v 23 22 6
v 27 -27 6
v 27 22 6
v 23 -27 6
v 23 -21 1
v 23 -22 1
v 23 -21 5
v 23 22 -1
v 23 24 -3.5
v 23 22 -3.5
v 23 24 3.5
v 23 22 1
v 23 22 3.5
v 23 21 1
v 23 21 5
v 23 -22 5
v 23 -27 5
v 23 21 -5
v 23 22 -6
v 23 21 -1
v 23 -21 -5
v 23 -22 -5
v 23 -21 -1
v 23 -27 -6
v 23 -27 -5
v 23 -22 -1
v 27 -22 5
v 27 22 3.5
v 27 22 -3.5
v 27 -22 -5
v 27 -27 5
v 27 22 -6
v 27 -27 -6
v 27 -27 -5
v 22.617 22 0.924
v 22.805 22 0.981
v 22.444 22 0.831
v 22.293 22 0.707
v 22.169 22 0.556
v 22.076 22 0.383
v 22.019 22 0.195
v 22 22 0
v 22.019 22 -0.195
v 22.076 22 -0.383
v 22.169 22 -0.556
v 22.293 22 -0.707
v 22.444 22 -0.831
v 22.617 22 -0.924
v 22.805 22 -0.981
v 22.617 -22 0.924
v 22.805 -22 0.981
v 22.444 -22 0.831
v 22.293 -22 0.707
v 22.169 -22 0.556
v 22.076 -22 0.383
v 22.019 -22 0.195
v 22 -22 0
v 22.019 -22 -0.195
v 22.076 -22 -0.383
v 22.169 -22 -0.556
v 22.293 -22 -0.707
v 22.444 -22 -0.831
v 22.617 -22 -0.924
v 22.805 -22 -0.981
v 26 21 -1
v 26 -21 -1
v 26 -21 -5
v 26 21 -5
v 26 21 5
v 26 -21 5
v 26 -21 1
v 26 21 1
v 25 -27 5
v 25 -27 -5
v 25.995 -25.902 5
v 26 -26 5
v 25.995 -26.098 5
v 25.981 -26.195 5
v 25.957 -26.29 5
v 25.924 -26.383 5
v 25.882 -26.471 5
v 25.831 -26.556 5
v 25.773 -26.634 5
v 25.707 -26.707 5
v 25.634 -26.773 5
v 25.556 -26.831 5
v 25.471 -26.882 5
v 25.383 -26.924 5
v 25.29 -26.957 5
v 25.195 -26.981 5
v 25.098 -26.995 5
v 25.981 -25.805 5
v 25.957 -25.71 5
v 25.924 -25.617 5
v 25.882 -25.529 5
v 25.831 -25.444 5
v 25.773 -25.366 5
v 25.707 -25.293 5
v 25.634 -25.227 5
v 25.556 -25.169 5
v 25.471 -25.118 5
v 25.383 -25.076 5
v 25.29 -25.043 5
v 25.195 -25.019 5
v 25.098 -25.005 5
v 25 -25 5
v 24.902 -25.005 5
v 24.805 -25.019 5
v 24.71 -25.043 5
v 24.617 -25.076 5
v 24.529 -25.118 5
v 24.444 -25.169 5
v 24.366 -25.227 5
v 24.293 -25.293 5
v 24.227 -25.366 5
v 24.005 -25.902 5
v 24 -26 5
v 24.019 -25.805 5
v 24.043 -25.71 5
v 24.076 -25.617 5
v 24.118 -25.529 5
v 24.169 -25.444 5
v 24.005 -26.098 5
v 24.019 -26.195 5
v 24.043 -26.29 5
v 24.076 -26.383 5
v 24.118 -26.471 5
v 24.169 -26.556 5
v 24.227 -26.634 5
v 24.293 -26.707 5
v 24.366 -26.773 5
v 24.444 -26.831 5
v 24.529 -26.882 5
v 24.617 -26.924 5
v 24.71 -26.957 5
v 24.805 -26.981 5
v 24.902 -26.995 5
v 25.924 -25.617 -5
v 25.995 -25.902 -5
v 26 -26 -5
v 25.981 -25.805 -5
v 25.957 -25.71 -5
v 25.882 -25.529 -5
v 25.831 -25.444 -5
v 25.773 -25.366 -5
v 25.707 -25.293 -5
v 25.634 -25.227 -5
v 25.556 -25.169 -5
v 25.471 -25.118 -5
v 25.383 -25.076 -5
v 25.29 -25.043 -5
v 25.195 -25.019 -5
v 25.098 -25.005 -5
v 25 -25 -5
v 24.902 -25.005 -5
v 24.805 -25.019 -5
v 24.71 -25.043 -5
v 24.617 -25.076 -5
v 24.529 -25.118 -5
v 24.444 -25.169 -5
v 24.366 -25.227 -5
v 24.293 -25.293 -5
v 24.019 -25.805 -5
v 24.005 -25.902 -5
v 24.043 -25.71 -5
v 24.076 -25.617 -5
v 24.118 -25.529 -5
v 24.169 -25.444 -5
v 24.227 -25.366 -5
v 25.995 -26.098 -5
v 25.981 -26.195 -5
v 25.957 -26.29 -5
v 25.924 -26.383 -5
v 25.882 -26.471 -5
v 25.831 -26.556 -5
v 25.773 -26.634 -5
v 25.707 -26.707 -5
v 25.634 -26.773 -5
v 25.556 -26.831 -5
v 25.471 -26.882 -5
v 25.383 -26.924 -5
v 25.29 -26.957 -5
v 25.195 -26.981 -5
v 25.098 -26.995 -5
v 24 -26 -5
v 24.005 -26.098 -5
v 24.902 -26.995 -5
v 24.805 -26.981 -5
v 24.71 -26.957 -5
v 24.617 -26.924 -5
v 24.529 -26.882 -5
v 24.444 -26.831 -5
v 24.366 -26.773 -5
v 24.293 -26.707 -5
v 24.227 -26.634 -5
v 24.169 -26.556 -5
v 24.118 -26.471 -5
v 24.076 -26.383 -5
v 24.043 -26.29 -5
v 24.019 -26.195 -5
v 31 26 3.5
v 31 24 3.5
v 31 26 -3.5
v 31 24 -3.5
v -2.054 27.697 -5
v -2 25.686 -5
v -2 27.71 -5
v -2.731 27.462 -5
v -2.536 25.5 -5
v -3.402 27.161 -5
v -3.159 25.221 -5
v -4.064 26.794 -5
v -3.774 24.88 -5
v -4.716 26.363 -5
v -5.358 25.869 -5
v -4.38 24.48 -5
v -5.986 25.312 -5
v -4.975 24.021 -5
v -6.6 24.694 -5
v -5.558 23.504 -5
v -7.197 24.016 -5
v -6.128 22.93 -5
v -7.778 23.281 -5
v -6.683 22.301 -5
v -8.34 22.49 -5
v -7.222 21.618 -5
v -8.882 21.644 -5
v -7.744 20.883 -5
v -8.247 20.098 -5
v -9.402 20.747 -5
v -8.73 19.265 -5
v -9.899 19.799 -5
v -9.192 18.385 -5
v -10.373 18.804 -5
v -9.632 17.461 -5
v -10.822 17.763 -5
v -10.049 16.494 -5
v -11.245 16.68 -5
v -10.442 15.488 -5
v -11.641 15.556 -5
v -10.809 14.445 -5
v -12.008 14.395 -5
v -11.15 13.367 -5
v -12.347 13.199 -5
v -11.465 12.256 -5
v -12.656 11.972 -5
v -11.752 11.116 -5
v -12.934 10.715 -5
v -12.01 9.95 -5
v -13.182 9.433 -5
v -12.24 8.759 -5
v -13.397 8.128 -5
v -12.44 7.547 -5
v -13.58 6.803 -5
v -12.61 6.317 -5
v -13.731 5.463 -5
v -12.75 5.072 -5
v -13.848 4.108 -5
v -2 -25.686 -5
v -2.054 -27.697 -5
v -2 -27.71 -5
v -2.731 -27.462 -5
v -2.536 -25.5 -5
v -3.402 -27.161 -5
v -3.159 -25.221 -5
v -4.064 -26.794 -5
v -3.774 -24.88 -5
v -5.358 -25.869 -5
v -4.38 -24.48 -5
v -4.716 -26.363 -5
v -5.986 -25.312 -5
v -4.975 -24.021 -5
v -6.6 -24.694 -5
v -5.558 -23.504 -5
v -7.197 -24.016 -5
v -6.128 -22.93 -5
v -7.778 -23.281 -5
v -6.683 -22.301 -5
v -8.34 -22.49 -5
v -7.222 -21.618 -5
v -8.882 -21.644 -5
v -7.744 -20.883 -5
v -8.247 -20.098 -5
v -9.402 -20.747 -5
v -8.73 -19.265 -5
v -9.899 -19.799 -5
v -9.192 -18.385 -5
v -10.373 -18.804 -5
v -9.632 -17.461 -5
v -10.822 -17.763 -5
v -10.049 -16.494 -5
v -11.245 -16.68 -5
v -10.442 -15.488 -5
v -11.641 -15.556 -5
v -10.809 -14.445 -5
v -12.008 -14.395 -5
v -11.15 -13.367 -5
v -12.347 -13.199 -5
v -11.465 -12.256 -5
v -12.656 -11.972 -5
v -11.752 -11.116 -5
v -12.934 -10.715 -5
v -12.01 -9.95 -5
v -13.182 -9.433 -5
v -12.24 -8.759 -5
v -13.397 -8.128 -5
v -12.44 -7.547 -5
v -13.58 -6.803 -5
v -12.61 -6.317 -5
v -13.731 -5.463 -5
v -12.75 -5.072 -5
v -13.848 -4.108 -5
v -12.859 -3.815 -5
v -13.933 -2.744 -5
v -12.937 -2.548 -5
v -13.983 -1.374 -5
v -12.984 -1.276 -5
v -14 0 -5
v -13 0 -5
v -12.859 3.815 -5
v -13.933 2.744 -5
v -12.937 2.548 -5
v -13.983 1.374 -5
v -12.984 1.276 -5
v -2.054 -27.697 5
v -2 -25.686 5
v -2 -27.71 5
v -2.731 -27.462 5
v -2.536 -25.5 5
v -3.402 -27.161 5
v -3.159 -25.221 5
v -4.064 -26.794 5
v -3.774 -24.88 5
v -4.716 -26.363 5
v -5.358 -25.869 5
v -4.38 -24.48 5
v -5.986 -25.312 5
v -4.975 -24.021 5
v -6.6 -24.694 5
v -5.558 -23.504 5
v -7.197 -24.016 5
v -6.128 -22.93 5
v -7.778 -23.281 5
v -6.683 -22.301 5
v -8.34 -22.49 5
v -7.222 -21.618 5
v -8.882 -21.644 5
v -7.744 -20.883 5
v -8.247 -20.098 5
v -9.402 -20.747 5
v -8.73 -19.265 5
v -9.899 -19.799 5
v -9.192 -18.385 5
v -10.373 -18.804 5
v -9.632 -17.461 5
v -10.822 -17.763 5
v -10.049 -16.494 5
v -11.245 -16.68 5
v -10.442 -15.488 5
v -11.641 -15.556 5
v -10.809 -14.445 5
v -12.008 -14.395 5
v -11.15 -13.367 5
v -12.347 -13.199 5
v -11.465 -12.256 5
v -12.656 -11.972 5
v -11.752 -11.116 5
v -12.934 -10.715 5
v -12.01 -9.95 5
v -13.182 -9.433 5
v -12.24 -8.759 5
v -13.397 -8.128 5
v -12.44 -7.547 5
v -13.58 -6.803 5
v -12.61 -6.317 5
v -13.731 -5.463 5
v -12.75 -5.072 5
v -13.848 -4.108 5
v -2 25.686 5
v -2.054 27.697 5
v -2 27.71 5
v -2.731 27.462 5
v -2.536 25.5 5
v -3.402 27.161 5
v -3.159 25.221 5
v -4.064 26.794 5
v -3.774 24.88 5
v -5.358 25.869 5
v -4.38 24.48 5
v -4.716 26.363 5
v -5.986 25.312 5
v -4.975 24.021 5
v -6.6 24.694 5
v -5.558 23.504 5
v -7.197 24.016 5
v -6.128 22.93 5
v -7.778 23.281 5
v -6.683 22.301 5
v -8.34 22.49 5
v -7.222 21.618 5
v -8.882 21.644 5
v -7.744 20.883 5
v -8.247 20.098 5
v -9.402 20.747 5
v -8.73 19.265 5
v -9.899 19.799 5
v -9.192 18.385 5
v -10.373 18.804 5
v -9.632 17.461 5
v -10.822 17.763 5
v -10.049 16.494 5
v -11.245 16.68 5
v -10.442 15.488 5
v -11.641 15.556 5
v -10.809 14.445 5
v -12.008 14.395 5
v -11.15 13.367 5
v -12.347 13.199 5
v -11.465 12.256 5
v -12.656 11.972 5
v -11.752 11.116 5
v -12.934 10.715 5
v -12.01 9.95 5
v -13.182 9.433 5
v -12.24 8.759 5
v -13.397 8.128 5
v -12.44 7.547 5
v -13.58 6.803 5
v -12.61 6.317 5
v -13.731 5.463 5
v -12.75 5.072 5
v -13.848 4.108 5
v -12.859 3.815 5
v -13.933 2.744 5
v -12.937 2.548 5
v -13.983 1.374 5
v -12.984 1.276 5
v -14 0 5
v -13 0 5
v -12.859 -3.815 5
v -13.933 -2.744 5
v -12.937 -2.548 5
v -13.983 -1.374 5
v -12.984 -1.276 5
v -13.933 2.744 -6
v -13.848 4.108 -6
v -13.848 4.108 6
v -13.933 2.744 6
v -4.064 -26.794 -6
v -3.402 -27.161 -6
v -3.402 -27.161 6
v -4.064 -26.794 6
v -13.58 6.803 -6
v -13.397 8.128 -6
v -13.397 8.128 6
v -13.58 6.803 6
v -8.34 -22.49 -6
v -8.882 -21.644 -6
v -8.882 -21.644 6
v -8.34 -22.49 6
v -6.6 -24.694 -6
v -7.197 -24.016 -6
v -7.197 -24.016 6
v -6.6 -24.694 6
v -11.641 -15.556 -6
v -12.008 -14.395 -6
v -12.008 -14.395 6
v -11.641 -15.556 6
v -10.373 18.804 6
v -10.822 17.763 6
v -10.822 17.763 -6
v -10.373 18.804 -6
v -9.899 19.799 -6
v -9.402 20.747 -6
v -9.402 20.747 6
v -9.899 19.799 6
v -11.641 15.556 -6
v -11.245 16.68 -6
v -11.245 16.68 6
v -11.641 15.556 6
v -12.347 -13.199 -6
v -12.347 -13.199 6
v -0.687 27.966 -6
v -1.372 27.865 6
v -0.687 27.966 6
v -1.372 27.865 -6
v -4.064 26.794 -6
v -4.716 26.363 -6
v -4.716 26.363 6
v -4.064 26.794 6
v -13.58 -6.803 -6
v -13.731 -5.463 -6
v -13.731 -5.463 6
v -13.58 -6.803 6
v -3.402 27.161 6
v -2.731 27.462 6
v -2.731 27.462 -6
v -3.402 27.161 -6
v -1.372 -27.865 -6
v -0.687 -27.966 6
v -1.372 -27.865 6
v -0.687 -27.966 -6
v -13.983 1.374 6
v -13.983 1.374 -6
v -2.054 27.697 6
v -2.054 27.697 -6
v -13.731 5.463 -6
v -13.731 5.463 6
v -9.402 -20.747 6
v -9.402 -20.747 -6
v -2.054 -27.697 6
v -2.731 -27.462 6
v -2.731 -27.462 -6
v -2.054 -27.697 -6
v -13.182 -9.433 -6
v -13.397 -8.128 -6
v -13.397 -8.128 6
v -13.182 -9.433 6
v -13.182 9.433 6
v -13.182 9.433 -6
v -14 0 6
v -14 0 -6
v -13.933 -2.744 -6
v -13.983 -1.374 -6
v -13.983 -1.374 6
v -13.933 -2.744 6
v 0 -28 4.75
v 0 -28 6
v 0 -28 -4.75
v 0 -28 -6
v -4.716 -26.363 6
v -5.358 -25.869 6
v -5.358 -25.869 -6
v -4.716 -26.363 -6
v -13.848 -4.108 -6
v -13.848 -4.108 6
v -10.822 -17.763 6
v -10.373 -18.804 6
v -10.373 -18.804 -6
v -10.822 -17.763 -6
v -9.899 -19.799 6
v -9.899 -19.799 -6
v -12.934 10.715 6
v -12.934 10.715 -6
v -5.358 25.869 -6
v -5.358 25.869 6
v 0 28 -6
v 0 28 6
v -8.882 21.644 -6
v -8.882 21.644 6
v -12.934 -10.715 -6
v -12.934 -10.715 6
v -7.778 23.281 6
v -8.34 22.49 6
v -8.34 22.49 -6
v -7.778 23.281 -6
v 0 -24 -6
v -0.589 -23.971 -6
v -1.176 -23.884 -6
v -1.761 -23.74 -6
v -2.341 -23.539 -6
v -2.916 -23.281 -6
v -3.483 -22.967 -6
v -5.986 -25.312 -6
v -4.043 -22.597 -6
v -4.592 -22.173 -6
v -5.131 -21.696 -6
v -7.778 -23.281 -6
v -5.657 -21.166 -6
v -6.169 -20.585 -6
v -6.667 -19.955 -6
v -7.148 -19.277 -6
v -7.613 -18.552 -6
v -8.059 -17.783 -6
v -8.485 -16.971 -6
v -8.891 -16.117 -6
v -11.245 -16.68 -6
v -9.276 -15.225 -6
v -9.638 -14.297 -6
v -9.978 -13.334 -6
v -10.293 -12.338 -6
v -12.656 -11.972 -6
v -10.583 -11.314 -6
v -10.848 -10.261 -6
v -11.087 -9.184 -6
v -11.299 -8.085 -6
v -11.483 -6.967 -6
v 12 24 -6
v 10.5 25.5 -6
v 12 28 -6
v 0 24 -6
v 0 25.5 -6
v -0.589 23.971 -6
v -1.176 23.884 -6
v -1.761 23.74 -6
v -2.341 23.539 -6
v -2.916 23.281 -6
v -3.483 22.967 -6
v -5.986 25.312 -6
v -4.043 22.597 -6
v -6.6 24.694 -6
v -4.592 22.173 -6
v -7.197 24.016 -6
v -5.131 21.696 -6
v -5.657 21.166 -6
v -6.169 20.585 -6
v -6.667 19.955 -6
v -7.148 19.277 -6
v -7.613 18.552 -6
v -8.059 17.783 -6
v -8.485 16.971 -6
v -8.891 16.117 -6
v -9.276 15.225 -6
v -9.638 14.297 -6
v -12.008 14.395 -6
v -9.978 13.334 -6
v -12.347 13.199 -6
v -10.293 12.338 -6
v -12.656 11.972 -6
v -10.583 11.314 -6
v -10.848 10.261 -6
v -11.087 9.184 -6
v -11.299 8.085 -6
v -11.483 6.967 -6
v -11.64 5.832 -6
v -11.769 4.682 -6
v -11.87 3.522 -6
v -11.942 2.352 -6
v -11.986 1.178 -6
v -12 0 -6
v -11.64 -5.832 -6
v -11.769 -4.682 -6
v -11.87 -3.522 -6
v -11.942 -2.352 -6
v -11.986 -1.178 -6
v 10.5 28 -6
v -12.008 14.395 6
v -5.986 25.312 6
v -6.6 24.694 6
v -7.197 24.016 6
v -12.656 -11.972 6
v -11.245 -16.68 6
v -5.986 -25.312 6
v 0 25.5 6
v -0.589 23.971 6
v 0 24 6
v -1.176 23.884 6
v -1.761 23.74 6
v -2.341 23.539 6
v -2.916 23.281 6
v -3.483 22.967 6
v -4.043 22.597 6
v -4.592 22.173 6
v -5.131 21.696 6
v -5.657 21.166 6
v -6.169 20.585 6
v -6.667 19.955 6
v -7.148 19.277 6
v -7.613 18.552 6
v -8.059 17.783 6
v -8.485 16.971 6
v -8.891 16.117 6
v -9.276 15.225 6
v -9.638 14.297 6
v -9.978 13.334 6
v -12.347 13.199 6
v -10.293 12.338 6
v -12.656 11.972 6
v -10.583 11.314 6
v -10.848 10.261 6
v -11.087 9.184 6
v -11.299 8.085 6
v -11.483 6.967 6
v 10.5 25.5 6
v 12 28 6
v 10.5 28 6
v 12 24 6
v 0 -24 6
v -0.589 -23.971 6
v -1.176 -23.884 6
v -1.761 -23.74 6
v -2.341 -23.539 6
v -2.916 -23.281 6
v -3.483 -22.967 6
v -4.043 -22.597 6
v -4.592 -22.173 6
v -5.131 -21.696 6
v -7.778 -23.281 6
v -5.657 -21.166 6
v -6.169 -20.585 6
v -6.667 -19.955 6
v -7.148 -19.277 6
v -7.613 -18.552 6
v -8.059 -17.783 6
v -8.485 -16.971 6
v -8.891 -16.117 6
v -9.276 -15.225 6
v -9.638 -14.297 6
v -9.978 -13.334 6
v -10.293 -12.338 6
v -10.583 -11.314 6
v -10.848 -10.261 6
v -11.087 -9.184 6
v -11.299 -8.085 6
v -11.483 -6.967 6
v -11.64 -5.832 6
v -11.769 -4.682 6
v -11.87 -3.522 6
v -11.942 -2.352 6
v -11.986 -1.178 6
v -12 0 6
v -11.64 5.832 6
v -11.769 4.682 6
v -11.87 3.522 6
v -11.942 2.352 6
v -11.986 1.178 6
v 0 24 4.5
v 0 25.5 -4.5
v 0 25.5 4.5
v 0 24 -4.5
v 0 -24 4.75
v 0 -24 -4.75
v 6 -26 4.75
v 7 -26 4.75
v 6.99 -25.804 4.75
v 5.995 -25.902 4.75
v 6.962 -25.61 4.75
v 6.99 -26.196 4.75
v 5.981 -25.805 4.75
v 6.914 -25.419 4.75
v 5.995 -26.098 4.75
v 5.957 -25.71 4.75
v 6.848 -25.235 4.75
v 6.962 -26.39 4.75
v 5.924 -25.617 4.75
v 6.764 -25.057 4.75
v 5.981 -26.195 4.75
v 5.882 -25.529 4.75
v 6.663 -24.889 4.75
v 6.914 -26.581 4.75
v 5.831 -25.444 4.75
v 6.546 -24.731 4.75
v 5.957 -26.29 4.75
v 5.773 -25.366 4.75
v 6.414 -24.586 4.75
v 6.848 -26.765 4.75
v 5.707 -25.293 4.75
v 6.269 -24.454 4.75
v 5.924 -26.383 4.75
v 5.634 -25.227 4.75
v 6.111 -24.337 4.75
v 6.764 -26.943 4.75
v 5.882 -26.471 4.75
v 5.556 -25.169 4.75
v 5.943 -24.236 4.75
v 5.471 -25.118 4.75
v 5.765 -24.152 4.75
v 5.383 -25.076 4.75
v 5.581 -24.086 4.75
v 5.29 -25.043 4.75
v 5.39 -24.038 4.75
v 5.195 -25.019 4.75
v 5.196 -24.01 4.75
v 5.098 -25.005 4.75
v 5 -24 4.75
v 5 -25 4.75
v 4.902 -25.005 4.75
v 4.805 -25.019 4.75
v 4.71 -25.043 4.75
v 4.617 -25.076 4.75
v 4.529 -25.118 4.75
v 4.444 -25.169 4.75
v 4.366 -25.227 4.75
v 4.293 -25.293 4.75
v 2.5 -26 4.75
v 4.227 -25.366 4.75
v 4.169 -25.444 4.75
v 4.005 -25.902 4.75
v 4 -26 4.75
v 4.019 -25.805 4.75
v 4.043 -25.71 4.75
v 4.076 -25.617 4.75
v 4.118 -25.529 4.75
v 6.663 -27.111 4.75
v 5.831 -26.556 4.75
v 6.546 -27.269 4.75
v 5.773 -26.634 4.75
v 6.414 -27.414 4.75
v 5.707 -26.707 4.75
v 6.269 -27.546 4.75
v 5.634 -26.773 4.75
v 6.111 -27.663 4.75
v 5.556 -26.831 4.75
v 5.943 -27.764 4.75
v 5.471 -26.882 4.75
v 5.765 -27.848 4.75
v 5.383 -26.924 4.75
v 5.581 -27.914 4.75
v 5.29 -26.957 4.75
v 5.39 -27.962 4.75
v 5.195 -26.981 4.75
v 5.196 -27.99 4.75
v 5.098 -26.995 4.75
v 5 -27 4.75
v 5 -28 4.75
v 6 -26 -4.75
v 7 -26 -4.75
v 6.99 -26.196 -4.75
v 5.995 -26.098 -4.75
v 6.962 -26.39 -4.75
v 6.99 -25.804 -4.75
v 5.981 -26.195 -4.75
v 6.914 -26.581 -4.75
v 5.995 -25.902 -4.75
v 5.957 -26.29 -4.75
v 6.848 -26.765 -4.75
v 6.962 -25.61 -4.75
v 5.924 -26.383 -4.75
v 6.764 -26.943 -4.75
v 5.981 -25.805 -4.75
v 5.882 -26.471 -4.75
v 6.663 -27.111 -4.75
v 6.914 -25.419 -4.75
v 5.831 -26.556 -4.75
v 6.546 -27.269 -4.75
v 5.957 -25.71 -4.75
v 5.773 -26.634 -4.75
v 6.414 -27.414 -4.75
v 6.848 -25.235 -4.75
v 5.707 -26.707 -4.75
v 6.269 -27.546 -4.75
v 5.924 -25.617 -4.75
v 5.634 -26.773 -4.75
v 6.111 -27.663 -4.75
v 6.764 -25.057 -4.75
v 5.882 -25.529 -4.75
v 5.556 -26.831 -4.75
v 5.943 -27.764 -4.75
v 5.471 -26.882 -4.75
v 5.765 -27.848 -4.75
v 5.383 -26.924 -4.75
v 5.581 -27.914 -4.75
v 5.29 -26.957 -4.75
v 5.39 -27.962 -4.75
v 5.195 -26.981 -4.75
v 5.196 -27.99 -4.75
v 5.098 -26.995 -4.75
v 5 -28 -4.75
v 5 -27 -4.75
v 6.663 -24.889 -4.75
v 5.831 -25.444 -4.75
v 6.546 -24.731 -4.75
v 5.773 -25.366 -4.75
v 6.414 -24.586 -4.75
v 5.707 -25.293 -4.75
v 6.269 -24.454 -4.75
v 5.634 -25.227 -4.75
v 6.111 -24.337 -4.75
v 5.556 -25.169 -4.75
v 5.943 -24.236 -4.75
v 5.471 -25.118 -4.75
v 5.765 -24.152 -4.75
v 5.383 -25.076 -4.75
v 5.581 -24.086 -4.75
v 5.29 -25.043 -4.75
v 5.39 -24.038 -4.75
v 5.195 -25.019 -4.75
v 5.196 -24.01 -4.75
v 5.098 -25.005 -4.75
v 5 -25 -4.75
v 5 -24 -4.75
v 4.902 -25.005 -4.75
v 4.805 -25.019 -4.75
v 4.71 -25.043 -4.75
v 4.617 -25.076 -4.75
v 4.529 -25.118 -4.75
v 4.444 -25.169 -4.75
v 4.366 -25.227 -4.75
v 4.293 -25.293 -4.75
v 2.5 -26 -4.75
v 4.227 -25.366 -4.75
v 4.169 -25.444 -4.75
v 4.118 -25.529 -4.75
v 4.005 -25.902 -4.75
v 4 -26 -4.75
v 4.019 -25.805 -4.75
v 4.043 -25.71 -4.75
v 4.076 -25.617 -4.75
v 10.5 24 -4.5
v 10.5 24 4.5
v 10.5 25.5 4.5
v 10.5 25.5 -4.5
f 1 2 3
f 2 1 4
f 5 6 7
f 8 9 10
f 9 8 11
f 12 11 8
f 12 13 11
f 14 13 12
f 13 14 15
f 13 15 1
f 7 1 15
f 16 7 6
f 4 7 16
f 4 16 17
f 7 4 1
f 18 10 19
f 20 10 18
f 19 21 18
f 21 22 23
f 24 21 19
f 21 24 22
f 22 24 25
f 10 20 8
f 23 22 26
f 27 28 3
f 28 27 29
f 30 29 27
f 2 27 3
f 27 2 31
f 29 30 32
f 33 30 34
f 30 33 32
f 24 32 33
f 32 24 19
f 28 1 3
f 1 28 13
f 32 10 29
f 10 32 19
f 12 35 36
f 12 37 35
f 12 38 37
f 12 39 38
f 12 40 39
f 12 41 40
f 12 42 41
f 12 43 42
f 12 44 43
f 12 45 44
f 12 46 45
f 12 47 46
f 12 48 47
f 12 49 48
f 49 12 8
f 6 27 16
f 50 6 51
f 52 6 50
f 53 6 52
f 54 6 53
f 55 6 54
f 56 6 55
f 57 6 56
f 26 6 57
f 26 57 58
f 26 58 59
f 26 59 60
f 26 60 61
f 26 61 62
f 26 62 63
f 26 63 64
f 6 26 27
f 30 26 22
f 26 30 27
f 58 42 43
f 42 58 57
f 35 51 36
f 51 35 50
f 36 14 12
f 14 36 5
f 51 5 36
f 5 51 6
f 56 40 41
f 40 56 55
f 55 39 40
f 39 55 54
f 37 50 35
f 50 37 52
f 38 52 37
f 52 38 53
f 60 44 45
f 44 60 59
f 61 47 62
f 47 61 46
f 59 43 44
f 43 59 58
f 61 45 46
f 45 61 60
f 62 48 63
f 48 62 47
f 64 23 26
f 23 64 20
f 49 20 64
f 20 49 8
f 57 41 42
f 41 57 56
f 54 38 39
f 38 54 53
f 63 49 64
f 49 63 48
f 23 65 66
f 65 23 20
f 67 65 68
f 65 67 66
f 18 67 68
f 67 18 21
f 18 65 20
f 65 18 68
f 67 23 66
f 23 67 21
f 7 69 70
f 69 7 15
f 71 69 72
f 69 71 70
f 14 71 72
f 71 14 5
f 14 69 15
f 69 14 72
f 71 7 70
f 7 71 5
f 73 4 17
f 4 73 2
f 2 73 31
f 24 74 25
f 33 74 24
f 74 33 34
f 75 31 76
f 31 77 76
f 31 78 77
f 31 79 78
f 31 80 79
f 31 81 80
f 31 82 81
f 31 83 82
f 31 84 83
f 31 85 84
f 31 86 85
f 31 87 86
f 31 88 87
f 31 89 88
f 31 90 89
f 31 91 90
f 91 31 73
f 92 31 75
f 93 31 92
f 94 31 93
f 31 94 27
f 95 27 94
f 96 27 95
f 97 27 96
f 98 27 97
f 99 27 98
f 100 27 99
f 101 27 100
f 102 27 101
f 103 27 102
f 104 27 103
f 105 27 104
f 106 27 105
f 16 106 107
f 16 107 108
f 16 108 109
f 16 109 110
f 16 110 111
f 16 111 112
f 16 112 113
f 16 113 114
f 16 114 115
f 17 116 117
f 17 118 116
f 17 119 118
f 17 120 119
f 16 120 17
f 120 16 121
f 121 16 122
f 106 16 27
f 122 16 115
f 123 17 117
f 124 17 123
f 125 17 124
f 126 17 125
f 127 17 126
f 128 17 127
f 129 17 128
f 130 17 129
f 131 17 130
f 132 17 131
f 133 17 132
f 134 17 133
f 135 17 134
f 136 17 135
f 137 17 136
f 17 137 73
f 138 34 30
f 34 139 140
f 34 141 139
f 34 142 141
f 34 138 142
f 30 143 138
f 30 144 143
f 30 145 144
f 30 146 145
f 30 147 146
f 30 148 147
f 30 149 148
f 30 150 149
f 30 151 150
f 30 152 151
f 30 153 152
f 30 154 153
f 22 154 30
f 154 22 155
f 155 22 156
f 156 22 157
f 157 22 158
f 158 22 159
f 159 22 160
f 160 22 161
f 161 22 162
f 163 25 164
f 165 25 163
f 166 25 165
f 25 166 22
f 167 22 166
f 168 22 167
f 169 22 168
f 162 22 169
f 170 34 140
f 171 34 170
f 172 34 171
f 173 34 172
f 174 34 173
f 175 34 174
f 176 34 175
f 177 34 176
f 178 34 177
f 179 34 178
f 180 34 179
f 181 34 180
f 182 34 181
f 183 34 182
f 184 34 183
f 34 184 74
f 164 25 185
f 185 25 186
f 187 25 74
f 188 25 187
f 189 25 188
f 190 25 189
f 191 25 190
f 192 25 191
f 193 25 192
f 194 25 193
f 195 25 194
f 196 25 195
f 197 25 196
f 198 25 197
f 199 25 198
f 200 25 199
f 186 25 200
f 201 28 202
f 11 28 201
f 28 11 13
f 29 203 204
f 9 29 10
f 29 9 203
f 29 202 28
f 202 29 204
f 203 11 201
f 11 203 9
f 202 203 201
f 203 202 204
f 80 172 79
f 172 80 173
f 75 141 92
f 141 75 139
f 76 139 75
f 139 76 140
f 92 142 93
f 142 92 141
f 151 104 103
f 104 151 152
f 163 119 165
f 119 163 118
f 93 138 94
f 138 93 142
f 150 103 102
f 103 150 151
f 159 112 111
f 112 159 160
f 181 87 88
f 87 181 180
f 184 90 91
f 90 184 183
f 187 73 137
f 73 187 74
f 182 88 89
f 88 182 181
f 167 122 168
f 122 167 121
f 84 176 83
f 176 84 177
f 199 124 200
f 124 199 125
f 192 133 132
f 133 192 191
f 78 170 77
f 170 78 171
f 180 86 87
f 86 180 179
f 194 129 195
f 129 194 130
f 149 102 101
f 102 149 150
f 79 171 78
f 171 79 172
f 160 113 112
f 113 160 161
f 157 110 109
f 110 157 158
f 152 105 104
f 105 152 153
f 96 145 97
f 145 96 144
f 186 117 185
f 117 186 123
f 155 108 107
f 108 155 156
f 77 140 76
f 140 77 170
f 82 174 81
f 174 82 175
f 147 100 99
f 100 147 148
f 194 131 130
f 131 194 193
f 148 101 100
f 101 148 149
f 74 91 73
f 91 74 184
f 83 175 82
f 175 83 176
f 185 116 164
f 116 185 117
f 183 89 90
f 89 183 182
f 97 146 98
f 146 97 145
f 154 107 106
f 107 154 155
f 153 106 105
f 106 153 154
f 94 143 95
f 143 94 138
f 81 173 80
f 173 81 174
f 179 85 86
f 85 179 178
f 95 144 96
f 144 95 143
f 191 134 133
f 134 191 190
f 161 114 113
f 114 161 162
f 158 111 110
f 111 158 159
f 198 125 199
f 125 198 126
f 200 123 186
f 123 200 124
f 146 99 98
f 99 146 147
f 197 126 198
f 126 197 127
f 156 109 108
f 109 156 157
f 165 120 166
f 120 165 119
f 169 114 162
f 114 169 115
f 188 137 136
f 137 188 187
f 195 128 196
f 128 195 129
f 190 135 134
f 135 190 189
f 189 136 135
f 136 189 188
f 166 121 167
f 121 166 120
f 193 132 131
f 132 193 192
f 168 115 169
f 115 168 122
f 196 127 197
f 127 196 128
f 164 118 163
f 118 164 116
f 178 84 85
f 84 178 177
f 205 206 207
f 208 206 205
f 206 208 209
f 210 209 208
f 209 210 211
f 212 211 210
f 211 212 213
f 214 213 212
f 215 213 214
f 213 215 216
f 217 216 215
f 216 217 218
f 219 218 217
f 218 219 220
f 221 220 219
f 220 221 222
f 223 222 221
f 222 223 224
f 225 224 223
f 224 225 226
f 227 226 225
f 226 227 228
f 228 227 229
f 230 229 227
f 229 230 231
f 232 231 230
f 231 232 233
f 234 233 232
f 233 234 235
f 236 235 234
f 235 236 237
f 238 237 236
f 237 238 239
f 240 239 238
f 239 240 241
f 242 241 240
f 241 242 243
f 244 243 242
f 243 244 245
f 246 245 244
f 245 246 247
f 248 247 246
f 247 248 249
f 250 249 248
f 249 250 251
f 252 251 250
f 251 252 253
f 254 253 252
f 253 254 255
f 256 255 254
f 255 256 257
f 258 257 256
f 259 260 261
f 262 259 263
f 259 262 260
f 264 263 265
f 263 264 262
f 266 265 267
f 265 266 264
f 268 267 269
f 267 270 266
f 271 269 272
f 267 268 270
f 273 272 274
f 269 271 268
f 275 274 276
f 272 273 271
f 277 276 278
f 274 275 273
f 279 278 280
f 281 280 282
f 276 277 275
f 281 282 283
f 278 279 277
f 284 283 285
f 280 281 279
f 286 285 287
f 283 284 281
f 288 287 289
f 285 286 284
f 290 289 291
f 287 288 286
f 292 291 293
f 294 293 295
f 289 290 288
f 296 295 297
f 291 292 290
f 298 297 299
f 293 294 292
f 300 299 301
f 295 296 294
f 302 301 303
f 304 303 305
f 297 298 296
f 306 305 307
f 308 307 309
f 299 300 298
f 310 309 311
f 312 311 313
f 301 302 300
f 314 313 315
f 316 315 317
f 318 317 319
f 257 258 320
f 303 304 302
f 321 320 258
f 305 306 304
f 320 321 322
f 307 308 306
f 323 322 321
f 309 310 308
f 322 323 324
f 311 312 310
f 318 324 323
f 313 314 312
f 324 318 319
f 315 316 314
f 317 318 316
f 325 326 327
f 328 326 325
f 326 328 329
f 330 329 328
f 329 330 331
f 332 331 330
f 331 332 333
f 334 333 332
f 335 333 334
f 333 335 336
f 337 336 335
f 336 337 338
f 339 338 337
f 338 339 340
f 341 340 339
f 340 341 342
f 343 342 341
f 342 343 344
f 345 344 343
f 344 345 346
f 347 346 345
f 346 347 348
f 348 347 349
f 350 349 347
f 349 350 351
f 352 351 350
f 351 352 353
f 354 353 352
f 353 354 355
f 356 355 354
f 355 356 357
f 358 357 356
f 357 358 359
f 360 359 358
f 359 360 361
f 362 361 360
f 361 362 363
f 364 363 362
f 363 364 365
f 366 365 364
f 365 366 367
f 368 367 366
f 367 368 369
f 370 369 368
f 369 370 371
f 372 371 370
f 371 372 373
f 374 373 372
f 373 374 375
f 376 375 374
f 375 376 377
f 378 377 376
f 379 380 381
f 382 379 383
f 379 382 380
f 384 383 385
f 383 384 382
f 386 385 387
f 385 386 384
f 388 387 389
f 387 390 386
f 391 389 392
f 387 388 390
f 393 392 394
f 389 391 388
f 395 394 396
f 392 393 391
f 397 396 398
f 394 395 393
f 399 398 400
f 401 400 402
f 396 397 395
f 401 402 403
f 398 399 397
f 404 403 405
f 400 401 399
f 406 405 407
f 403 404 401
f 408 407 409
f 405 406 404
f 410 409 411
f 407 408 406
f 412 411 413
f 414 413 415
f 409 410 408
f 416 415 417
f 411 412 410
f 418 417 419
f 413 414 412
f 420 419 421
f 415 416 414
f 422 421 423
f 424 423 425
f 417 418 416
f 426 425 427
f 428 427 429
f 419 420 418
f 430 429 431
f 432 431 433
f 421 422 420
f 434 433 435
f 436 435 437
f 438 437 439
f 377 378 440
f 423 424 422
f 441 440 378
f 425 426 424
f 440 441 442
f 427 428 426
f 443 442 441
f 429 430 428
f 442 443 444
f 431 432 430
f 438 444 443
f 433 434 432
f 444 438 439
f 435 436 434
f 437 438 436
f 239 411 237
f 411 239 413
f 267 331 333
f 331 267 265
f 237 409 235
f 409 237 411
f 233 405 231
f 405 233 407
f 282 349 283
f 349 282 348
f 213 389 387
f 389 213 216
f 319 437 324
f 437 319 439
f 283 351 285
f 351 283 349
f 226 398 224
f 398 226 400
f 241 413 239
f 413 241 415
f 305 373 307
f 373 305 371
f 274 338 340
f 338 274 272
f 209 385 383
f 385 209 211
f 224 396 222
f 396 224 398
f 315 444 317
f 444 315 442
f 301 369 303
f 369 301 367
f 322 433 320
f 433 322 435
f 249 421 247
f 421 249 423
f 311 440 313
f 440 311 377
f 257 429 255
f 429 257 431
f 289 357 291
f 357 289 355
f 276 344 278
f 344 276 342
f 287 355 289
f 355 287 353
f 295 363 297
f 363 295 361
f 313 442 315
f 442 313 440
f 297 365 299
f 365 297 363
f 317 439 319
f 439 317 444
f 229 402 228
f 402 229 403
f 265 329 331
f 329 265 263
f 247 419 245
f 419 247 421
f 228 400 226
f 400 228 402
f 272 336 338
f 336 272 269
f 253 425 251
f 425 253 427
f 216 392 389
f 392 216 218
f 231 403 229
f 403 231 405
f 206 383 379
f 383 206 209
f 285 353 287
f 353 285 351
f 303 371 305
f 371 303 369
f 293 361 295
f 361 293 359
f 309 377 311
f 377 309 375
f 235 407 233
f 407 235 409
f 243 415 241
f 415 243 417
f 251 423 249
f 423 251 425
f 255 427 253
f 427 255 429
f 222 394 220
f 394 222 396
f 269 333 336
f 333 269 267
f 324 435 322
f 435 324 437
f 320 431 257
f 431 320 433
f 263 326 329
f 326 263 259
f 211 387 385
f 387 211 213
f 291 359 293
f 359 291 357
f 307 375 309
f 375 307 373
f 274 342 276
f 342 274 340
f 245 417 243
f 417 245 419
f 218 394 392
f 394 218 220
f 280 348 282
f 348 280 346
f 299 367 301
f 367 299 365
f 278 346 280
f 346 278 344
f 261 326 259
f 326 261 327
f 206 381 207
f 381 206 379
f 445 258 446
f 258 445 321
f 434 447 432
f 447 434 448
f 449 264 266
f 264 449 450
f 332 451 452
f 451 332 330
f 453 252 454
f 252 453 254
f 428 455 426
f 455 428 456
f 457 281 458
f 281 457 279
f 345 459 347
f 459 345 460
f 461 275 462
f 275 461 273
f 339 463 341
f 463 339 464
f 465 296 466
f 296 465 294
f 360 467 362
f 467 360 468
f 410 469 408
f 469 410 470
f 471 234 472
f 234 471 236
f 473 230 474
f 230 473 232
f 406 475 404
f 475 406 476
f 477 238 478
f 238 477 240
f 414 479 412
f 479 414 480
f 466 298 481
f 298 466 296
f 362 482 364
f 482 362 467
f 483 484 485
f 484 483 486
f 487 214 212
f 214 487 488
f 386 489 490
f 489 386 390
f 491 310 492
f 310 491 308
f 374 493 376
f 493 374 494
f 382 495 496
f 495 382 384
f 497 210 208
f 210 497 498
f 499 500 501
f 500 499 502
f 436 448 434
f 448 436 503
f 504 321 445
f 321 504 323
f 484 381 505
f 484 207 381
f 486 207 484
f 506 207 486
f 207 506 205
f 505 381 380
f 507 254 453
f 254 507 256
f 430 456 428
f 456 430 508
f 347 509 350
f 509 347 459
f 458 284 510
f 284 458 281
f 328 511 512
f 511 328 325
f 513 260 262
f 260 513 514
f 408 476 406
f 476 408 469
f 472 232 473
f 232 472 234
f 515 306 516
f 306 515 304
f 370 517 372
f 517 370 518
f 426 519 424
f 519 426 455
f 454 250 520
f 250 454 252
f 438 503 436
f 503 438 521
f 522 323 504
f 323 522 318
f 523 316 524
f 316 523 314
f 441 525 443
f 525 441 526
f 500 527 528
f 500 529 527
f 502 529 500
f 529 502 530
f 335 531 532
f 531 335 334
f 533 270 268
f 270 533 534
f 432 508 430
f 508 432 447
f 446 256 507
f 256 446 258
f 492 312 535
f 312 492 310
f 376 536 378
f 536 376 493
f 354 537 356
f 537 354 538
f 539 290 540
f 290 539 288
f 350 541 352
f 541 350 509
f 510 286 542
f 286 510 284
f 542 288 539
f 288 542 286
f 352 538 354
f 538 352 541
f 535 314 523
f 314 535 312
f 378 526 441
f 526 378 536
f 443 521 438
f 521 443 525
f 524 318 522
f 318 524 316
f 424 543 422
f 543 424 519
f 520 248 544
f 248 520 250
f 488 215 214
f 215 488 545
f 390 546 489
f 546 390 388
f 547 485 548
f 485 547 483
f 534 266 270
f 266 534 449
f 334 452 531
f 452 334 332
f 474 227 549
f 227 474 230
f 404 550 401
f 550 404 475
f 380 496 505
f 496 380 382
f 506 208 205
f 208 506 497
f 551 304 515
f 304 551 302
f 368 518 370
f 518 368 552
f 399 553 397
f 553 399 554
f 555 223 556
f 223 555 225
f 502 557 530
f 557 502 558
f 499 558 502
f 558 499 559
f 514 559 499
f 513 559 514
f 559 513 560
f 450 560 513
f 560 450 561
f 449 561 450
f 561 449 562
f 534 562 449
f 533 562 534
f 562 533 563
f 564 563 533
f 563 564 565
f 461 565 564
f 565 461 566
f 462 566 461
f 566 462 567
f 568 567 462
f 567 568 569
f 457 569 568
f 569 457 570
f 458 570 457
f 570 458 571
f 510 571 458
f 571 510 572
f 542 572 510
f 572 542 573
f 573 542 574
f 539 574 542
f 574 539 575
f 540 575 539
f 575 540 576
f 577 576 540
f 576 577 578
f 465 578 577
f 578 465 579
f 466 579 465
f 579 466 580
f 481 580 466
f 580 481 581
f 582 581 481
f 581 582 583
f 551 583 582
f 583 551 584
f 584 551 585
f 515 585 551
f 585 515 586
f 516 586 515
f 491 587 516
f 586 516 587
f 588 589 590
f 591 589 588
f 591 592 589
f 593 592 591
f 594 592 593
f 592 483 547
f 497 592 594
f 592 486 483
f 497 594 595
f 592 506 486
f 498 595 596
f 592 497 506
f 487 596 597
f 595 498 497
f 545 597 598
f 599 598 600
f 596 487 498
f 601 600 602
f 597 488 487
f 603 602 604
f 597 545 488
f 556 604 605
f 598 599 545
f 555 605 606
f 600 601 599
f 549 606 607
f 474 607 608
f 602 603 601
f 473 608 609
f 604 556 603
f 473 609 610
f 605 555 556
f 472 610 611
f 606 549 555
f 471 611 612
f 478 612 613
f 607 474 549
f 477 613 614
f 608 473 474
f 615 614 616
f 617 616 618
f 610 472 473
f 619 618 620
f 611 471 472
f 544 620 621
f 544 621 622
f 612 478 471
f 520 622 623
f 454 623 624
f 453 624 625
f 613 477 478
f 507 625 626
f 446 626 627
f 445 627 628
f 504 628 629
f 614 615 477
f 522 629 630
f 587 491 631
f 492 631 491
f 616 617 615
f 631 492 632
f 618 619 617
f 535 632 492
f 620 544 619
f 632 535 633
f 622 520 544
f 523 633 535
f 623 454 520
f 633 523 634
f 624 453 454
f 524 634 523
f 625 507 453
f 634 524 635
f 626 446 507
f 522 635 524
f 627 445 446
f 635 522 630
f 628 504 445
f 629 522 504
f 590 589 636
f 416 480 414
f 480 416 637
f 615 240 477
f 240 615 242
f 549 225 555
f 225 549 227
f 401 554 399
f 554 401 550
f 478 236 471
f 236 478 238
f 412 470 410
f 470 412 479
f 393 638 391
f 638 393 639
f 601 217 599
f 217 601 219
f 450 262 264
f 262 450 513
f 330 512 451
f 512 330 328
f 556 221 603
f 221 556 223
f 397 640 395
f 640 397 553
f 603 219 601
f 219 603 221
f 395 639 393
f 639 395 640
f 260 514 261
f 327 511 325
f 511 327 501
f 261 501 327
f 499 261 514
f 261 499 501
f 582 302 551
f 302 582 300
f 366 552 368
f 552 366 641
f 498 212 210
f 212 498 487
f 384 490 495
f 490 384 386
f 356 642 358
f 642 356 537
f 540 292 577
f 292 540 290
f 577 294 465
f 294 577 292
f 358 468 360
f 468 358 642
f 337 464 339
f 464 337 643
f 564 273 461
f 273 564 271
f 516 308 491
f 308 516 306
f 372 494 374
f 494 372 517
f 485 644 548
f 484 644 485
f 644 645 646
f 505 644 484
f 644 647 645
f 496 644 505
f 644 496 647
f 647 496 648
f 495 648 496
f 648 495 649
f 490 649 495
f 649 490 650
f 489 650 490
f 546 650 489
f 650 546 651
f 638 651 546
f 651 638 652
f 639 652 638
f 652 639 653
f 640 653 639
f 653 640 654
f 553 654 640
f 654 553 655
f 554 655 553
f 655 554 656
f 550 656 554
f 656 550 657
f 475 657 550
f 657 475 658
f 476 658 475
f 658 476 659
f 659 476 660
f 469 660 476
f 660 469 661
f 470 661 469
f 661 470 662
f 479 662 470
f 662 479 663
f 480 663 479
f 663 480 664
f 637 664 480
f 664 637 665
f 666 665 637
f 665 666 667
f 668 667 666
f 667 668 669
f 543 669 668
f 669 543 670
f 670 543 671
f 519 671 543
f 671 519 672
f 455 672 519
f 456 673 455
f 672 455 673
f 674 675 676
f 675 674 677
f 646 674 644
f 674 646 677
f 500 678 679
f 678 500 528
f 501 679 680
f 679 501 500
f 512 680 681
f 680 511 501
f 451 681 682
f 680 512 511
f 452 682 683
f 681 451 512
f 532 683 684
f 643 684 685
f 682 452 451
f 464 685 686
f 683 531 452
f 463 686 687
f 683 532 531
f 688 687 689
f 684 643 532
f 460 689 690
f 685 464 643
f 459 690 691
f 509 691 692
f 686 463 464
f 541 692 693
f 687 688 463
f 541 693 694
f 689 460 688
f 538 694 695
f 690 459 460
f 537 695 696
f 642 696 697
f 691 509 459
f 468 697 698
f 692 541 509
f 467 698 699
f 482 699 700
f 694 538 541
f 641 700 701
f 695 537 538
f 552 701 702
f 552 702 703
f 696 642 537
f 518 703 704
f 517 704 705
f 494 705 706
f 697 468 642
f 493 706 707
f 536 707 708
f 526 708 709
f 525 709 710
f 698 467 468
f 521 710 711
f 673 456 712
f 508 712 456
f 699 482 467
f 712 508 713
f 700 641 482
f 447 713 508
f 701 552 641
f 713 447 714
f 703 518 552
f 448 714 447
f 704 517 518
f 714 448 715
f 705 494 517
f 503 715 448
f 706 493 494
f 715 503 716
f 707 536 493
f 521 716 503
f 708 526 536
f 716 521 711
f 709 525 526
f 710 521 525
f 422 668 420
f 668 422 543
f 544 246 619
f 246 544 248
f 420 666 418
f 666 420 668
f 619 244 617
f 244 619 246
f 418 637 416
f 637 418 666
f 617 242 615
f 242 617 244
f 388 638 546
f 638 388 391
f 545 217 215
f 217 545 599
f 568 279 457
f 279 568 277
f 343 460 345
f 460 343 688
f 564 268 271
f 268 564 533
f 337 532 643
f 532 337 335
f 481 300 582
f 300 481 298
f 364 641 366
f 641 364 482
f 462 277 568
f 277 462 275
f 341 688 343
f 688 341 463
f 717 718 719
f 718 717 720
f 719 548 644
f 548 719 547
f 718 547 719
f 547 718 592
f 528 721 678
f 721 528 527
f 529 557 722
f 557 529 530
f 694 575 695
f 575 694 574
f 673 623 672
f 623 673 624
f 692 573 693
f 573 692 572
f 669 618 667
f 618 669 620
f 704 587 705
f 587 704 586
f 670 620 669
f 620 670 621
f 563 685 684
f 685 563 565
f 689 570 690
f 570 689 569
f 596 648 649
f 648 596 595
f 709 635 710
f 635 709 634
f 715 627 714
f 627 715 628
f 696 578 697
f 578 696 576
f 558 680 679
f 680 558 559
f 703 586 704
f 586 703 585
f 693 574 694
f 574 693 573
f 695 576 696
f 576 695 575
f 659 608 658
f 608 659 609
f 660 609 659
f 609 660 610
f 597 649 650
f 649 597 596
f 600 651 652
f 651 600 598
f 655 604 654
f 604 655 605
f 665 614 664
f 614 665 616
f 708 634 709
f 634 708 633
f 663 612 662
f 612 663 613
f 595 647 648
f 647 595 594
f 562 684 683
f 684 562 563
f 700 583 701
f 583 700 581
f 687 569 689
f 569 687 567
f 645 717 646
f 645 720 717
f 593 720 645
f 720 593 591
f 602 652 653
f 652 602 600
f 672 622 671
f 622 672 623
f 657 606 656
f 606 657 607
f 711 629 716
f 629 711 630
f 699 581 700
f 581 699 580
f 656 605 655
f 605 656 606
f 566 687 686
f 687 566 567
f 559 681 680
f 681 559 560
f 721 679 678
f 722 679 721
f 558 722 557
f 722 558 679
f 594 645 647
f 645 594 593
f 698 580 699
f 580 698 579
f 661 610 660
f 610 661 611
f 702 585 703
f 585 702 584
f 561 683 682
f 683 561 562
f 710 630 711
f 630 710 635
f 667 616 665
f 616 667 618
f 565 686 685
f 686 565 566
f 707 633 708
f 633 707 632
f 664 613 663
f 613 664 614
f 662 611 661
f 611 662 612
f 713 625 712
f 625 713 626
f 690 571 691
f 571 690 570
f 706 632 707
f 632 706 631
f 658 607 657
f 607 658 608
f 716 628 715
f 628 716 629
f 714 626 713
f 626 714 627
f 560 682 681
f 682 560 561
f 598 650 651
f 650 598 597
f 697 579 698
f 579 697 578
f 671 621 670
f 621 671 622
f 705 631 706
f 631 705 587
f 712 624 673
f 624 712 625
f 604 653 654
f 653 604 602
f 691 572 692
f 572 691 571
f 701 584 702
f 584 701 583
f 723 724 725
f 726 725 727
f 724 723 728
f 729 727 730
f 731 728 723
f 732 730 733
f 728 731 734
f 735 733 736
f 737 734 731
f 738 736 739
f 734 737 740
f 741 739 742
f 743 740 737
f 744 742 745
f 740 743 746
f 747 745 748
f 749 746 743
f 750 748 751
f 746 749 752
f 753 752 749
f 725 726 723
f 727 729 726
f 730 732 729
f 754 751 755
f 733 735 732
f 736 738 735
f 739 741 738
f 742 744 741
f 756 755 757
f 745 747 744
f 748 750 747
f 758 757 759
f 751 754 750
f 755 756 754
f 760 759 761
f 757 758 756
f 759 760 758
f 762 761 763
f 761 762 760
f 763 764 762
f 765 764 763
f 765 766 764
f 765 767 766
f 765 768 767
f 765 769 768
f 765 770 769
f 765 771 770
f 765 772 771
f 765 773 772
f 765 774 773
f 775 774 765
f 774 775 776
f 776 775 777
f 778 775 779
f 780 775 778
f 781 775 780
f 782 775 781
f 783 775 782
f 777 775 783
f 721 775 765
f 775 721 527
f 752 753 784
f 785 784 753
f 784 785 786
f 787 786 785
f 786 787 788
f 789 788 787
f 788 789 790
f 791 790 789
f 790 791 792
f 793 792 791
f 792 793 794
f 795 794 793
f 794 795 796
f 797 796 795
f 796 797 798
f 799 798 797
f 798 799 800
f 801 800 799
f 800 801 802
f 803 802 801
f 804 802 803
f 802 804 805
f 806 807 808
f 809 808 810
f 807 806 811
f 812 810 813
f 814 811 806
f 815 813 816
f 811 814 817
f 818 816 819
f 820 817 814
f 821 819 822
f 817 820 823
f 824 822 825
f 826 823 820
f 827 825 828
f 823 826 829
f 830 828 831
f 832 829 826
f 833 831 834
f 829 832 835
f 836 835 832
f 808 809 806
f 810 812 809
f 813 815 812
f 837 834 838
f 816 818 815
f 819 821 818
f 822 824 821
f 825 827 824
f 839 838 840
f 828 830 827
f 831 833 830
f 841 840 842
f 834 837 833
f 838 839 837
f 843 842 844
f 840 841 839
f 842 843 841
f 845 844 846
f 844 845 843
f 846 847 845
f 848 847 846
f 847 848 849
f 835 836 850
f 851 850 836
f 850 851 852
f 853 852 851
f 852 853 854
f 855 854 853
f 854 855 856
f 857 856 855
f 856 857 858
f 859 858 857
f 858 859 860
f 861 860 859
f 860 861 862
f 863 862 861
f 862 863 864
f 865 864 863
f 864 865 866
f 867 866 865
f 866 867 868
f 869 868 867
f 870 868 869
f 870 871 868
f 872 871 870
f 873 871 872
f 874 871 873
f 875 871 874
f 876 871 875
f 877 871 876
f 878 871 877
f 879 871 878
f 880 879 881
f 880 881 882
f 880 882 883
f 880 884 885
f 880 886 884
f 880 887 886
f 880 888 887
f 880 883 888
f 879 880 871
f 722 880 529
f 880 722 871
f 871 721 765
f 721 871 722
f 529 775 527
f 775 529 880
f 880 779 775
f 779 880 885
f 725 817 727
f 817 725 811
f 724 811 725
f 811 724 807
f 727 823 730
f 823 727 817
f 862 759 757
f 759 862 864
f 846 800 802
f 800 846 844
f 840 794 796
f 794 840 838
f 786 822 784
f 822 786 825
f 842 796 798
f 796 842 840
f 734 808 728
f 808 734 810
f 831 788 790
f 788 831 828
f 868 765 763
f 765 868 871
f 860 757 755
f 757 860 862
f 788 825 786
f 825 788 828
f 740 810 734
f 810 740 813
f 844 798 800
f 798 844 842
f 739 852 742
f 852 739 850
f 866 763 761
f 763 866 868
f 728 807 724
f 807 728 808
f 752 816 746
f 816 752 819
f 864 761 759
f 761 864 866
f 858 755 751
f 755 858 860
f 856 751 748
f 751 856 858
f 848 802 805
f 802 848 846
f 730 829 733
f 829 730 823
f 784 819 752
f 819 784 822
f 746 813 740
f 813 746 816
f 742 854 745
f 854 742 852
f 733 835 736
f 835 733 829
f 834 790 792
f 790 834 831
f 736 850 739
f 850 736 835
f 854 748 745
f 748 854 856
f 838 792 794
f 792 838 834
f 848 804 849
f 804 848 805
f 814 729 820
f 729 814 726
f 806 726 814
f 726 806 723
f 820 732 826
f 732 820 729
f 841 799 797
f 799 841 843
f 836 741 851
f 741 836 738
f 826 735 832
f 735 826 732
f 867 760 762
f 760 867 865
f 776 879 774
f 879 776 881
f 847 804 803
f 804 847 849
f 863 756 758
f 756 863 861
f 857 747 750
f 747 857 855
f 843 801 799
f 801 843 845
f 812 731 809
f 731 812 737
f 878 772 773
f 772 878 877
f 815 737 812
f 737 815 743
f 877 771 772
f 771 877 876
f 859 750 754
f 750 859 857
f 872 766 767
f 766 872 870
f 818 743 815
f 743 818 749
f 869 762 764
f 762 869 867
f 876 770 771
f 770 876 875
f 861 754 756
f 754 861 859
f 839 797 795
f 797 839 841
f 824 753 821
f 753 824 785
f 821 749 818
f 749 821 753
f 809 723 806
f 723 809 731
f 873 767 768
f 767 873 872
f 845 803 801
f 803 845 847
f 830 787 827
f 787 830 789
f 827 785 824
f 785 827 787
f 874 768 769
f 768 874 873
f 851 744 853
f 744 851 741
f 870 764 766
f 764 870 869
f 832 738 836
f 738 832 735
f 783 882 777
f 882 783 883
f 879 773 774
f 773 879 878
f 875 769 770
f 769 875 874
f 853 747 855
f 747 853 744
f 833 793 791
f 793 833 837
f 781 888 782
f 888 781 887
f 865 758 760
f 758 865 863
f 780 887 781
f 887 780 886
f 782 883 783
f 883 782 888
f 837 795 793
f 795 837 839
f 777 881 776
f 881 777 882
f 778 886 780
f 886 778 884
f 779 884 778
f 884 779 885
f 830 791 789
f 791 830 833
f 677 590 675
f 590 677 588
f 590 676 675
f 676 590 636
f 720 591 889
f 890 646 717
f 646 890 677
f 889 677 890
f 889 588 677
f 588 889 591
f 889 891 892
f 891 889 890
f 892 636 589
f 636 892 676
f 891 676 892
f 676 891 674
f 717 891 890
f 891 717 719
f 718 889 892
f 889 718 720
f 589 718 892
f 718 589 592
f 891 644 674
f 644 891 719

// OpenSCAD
nut_width = 44;
capo_length = 12;
capo_back_thickness = 4;
capo_front_thickness = 4;
neck_shape = 0.5;
fretboard_height = 5;
articulation_radius = 2;
articulation_offset = 2;
clip_height = 7;

// front side
translate([20, 0, 0])
translate([fretboard_height, 0, 0]) {
	rotate([0, -90, 0]) difference() {
		// main thing
		union() {
			cube(size=[capo_length, nut_width, capo_front_thickness], center = true);
			translate([0, 0, 2])
				rotate([90, 0, 0])
					cylinder(h = nut_width, r = 1, $fn = 32, center = true);
		}
		
		// cut outs
		translate([-3, 0, 1])
			cube(size = [4, nut_width - 2, 4], center = true);
		translate([3, 0, 1])
			cube(size = [4, nut_width - 2, 4], center = true);
	}

	// articulation attachment
	translate([0, -nut_width/2 -capo_back_thickness/2, 0]) {
		difference() {
			cube(size = [capo_front_thickness, capo_back_thickness + articulation_offset, capo_length], center = true);
			cube(size = [capo_front_thickness + 2, capo_back_thickness + articulation_offset + 2, capo_length - 2], center = true);
		}
	}

	// articulation front
	translate([0, -nut_width/2 -capo_back_thickness/2 - articulation_offset, 0])
		cylinder(h = capo_length, r = articulation_radius/2, $fn=64, center = true);

	// clip attachment
	translate([capo_front_thickness/2, nut_width/2 + capo_back_thickness/2, 0]) {
		scale([capo_front_thickness*2, capo_back_thickness, clip_height]) {
			union() {
				difference() {
					rotate([0, 0, 45]) cube(size=[sqrt(2)/2,sqrt(2)/2,1], center=true);
					translate([0, 0.5, 0]) cube(size=[1, 1, 2], center=true);
				}
				translate([-0.25, -0.25, 0]) cube(size=[0.5,0.5,1], center=true);
				translate([0.5, 0, 0]) scale([2, 1, 1]) rotate([0, 0, 270]) difference() {
					rotate([0, 0, 45]) cube(size=[sqrt(2)/2,sqrt(2)/2,1], center=true);
					translate([0, 0.5, 0]) cube(size=[1, 1, 2], center=true);
					translate([0.5, 0, 0]) cube(size=[1, 1, 2], center=true);
				}
			}
		}
	}
}

// back side
scale([neck_shape, 1, 1])
difference() {
	// main cylinder
	cylinder(h = capo_length, r = nut_width/2 + capo_back_thickness + articulation_offset, $fn = 128, center = true);
	
	// cut half off
	translate([nut_width/2, 0, 0])
		cube(size=[nut_width, nut_width + 2*capo_back_thickness + articulation_offset + 2, capo_length+1], center = true);
	// inner cylinder
	cylinder(h = capo_length+2, r = nut_width/2 + articulation_offset, $fn = 128, center = true);

	// outer cutout
	difference() {
		cylinder(h = capo_length-2, r = nut_width + capo_back_thickness + articulation_offset, $fn = 128, center = true);
		cylinder(h = capo_length, r = nut_width/2 + capo_back_thickness/2 + articulation_offset, $fn = 128, center = true);
		translate([nut_width/2 - capo_back_thickness, 0, 0])
			cube(size=[nut_width, nut_width + 2*capo_back_thickness + articulation_offset + 2, capo_length+1], center = true);
	}
}

// articulation attachment
translate([fretboard_height/2, -nut_width/2 -capo_back_thickness/2 -articulation_offset, 0]) {
	scale([fretboard_height, capo_back_thickness, capo_length - 2.5]) {
		difference() {
			cube(size=[1, 1, 1], center = true);
			rotate([0, 0, 180+45]) translate([-1, 0, -1]) cube(size=[2, 2, 2]);
		}
	}
	translate([0, capo_back_thickness/4]) cube(size = [fretboard_height - articulation_radius, capo_back_thickness/2 , capo_length - 2.5], center=true);
}

// articulation back
translate([fretboard_height, -nut_width/2 -capo_back_thickness/2 -articulation_offset, 0]) {
	difference() {
		cylinder(h = capo_length - 2.5, r = articulation_radius, $fn=64, center = true);
		translate([-2, -2, 0]) cube(size = [4, 4, capo_length+2], center = true);
		cylinder(h = capo_length+2, r = articulation_radius/2, $fn=64, center = true);
	}
}

// clip
translate([3/4*capo_front_thickness + fretboard_height/2 + 0.5, nut_width/2 + capo_back_thickness/2 + articulation_offset, 0]) {
	difference() {
		cube(size=[3/2*capo_front_thickness + fretboard_height + 1, capo_back_thickness, capo_length], center=true);
		translate([-1, 0, 0])
			cube(size=[3/2*capo_front_thickness + fretboard_height, capo_back_thickness + 1, clip_height+2], center=true);
		translate([-1, capo_back_thickness/2, 0])	
			cube(size=[3/2*capo_front_thickness + fretboard_height, capo_back_thickness + 1, capo_length+2], center=true);
	}
}
